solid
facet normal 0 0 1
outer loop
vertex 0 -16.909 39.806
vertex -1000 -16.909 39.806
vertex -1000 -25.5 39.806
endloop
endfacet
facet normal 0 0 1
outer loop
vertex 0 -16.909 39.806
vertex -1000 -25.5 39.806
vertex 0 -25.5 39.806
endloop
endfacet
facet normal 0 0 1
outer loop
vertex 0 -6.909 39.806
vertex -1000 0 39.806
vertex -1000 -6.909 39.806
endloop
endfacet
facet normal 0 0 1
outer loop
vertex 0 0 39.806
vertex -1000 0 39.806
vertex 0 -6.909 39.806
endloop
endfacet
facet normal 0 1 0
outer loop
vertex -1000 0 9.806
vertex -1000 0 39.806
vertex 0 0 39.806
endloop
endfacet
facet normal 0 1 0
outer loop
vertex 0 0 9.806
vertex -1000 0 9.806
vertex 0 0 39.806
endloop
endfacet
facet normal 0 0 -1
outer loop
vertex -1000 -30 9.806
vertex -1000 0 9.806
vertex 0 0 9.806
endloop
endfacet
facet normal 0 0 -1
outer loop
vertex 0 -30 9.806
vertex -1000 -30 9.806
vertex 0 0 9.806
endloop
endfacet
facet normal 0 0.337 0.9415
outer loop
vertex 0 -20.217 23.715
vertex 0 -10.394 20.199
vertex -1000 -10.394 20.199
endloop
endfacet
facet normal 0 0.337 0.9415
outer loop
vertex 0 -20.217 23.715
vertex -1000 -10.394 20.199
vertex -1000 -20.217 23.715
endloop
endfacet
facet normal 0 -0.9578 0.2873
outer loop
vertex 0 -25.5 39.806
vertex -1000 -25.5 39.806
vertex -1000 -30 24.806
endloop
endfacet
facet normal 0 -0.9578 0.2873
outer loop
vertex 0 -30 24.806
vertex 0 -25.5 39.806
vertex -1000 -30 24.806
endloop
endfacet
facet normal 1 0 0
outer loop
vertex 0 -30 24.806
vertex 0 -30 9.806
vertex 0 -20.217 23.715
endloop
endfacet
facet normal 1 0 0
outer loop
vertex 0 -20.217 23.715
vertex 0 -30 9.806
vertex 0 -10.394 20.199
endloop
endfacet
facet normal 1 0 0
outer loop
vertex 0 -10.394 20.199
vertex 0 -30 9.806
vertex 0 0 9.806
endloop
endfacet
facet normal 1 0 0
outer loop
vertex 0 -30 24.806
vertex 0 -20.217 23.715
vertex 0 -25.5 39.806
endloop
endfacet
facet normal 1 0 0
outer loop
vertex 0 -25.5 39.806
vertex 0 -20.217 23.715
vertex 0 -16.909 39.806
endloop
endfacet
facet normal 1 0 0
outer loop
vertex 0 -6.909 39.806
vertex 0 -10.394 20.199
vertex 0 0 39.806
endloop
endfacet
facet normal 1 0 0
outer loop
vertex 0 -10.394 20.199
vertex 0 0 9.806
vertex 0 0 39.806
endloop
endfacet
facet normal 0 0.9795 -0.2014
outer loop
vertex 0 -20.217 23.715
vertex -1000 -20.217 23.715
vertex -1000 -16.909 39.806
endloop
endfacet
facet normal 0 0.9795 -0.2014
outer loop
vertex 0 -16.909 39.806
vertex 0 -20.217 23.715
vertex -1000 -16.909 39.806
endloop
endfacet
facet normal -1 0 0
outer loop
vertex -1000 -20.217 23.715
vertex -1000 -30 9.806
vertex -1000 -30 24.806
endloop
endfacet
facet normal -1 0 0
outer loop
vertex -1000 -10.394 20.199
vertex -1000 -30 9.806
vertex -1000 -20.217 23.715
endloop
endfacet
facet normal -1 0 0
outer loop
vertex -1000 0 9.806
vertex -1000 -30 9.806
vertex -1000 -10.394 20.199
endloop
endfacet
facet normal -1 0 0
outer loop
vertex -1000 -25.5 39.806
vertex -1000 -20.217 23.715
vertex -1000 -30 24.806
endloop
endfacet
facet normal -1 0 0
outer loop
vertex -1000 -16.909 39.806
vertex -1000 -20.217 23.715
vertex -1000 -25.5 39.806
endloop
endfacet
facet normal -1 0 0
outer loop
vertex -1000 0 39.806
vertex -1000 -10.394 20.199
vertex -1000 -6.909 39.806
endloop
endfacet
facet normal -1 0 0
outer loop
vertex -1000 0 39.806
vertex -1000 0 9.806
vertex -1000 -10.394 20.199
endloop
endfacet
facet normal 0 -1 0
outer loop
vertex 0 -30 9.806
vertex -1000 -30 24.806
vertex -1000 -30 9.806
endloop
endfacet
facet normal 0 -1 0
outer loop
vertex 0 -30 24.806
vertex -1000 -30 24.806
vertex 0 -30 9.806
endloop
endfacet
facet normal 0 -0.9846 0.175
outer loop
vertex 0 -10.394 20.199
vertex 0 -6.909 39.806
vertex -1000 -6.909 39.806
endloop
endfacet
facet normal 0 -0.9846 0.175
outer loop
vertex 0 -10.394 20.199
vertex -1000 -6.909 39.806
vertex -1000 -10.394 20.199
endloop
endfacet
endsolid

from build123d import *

# Parameters (mm, degrees)
F0_W     = 1000
F0_H     = 30
F1_DEPTH = 30
F3_DEPTH = 2027
F5_DEPTH = 2087


with BuildPart() as f1:
    # F0 (on Front) → F1 (new body)
    with BuildSketch(Plane.XZ):
        with Locations((-500, 24.806101)):
            Rectangle(F0_W, F0_H)
    extrude(amount=F1_DEPTH)

    # F2 (on face) → F3 (cut)
    with BuildSketch(Plane(origin=(-1000, 0, 0), x_dir=(0, -1, 0), z_dir=(-1, 0, 0))):
        Polygon((20.216802, 23.715444), (16.909165, 39.806101), (6.909165, 39.806101), (10.394015, 20.198643), align=None)
    extrude(amount=-F3_DEPTH, mode=Mode.SUBTRACT)

    # F4 (on face) → F5 (cut)
    with BuildSketch(Plane(origin=(-1000, 0, 0), x_dir=(0, -1, 0), z_dir=(-1, 0, 0))):
        Polygon((30, 39.806101), (22.5, 49.806101), (30, 24.806101), align=None)
    extrude(amount=-F5_DEPTH, mode=Mode.SUBTRACT)


solid = f1.part
